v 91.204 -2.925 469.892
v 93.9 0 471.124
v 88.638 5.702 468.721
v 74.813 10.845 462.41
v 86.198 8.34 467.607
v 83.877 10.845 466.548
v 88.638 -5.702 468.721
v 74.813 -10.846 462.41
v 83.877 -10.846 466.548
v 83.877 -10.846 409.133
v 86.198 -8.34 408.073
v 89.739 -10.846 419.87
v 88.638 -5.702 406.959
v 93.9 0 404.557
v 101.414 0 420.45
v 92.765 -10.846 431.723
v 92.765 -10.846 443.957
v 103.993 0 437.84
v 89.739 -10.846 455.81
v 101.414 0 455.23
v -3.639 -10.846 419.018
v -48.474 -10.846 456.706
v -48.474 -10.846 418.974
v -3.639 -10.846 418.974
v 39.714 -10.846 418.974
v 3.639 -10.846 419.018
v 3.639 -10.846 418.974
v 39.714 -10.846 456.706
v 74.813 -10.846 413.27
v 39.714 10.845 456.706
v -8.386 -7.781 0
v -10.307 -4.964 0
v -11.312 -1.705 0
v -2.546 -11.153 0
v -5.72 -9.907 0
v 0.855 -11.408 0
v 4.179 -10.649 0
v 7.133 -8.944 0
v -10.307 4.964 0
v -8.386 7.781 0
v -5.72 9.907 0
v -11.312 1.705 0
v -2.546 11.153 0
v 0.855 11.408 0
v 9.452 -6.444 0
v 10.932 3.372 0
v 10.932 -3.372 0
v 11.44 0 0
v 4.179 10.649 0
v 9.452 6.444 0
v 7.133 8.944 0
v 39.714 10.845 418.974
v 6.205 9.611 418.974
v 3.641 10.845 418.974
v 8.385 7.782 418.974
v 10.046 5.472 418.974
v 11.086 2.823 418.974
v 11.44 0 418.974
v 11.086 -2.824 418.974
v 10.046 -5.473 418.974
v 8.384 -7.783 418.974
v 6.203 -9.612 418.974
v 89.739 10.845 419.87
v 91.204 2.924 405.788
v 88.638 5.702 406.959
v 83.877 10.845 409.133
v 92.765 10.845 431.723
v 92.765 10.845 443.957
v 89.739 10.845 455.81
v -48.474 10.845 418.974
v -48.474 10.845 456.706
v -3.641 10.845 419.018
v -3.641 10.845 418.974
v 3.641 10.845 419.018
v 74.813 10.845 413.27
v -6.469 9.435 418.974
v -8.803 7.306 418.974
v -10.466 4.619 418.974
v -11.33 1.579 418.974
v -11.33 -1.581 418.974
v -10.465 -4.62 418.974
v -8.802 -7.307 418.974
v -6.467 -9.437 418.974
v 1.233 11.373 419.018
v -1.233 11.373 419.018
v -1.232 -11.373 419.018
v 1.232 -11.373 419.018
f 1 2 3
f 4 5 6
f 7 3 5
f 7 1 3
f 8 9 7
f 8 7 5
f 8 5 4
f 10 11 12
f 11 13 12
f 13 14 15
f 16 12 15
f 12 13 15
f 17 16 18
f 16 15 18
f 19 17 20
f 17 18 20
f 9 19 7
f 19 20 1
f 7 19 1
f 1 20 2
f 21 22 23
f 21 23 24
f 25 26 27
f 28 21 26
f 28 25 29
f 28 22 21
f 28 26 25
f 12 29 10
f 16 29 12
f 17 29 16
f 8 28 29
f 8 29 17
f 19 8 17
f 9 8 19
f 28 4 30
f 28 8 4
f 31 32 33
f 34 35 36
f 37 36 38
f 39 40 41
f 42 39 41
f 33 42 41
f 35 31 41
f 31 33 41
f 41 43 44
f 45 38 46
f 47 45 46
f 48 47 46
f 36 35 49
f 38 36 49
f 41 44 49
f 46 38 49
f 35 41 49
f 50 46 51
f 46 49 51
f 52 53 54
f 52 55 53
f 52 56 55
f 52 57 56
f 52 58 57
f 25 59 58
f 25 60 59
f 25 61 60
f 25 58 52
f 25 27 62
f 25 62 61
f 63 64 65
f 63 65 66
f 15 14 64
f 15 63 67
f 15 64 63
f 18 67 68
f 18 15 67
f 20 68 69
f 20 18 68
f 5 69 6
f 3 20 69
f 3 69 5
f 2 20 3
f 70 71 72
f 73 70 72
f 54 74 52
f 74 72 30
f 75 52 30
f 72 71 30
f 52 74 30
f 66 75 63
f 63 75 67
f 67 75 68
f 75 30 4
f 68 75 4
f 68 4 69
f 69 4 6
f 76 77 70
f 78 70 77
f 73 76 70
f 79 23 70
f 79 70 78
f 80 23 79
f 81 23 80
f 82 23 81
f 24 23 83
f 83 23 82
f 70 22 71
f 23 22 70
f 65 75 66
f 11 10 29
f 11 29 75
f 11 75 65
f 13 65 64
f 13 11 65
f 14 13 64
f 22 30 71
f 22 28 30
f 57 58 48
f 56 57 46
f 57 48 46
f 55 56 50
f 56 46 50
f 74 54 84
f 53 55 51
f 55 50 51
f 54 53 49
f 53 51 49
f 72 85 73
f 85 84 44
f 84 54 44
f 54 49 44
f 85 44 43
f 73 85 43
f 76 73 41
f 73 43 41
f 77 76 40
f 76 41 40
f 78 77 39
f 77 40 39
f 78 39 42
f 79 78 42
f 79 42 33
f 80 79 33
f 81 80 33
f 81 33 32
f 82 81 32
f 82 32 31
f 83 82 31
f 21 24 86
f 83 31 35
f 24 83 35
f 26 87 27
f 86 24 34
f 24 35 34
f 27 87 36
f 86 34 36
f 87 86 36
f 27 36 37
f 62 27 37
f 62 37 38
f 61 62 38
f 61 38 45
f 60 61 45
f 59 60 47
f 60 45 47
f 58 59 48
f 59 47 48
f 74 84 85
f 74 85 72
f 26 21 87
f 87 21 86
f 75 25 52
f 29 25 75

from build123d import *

# Parameters (mm, degrees)
F0_R          = 11.4398919201
F1_DEPTH      = 419.01794
F3_DEPTH      = 10.8458
F3_DEPTH_BACK = 10.84517
F4_T2_ANGLE   = 127.5095974459
F4_T4_ANGLE   = 127.5095974459


# Not quite as in the source:
# - a fillet or chamfer that OpenCascade refuses, or shapes differently, is made with other operations: its cross-section is extruded or revolved along the edge and cut away or added


with BuildPart() as f1:
    # F0 (on Top) → F1 (new body)
    with BuildSketch(Plane.XY):
        Circle(F0_R)
    extrude(amount=F1_DEPTH)

    # F2 (on Front) → F3 (join, two sides)
    with BuildSketch(Plane.XZ) as f3_sk:
        with BuildLine():
            Line((-48.4741501155, 456.7061818215), (-48.4741501155, 418.9741480511))
            Line((-48.4741501155, 418.9741480511), (39.7135697317, 418.9741480511))
            Line((39.7135697317, 418.9741480511), (74.8131631411, 413.270452539))
            Line((74.8131631411, 413.270452539), (95.608628696, 403.7768645791))
            ThreePointArc((95.608628696, 403.7768645791), (105.8473453497, 437.8401649363), (95.608628696, 471.9034652936))
            Line((95.608628696, 471.9034652936), (74.8131631411, 462.4098773337))
            Line((74.8131631411, 462.4098773337), (39.7135697317, 456.7061818215))
            Line((39.7135697317, 456.7061818215), (-48.4741501155, 456.7061818215))
        make_face()
    extrude(amount=F3_DEPTH)
    extrude(f3_sk.sketch, amount=-F3_DEPTH_BACK)

    # F4: chamfer of 12.7 on 2 edges, made by hand

    # F4_s1 → F4_t2 (revolve, cut)
    with BuildSketch(Plane(origin=(209.1067778356, 0, 103.0982793805), x_dir=(0, 1, 0), z_dir=(-0.8969097816, 0, -0.4422135724))):
        Polygon((-10.8458, -324.1347521568), (1.8542, -311.4347521568), (-10.8458, -311.4347521568), align=None)
    revolve(axis=Axis((44.0652005391, -10.8458, 437.8401649363), (0, -1, 0)), revolution_arc=F4_T2_ANGLE, mode=Mode.SUBTRACT)

    # F4_s3 → F4_t4 (revolve, cut)
    with BuildSketch(Plane(origin=(209.1067778356, 0, 103.0982793805), x_dir=(0, 1, 0), z_dir=(-0.8969097816, 0, -0.4422135724))):
        Polygon((10.84517, -324.1347521568), (-1.85483, -311.4347521568), (10.84517, -311.4347521568), align=None)
    revolve(axis=Axis((44.0652005391, 10.84517, 437.8401649363), (0, -1, 0)), revolution_arc=F4_T4_ANGLE, mode=Mode.SUBTRACT)


solid = f1.part
